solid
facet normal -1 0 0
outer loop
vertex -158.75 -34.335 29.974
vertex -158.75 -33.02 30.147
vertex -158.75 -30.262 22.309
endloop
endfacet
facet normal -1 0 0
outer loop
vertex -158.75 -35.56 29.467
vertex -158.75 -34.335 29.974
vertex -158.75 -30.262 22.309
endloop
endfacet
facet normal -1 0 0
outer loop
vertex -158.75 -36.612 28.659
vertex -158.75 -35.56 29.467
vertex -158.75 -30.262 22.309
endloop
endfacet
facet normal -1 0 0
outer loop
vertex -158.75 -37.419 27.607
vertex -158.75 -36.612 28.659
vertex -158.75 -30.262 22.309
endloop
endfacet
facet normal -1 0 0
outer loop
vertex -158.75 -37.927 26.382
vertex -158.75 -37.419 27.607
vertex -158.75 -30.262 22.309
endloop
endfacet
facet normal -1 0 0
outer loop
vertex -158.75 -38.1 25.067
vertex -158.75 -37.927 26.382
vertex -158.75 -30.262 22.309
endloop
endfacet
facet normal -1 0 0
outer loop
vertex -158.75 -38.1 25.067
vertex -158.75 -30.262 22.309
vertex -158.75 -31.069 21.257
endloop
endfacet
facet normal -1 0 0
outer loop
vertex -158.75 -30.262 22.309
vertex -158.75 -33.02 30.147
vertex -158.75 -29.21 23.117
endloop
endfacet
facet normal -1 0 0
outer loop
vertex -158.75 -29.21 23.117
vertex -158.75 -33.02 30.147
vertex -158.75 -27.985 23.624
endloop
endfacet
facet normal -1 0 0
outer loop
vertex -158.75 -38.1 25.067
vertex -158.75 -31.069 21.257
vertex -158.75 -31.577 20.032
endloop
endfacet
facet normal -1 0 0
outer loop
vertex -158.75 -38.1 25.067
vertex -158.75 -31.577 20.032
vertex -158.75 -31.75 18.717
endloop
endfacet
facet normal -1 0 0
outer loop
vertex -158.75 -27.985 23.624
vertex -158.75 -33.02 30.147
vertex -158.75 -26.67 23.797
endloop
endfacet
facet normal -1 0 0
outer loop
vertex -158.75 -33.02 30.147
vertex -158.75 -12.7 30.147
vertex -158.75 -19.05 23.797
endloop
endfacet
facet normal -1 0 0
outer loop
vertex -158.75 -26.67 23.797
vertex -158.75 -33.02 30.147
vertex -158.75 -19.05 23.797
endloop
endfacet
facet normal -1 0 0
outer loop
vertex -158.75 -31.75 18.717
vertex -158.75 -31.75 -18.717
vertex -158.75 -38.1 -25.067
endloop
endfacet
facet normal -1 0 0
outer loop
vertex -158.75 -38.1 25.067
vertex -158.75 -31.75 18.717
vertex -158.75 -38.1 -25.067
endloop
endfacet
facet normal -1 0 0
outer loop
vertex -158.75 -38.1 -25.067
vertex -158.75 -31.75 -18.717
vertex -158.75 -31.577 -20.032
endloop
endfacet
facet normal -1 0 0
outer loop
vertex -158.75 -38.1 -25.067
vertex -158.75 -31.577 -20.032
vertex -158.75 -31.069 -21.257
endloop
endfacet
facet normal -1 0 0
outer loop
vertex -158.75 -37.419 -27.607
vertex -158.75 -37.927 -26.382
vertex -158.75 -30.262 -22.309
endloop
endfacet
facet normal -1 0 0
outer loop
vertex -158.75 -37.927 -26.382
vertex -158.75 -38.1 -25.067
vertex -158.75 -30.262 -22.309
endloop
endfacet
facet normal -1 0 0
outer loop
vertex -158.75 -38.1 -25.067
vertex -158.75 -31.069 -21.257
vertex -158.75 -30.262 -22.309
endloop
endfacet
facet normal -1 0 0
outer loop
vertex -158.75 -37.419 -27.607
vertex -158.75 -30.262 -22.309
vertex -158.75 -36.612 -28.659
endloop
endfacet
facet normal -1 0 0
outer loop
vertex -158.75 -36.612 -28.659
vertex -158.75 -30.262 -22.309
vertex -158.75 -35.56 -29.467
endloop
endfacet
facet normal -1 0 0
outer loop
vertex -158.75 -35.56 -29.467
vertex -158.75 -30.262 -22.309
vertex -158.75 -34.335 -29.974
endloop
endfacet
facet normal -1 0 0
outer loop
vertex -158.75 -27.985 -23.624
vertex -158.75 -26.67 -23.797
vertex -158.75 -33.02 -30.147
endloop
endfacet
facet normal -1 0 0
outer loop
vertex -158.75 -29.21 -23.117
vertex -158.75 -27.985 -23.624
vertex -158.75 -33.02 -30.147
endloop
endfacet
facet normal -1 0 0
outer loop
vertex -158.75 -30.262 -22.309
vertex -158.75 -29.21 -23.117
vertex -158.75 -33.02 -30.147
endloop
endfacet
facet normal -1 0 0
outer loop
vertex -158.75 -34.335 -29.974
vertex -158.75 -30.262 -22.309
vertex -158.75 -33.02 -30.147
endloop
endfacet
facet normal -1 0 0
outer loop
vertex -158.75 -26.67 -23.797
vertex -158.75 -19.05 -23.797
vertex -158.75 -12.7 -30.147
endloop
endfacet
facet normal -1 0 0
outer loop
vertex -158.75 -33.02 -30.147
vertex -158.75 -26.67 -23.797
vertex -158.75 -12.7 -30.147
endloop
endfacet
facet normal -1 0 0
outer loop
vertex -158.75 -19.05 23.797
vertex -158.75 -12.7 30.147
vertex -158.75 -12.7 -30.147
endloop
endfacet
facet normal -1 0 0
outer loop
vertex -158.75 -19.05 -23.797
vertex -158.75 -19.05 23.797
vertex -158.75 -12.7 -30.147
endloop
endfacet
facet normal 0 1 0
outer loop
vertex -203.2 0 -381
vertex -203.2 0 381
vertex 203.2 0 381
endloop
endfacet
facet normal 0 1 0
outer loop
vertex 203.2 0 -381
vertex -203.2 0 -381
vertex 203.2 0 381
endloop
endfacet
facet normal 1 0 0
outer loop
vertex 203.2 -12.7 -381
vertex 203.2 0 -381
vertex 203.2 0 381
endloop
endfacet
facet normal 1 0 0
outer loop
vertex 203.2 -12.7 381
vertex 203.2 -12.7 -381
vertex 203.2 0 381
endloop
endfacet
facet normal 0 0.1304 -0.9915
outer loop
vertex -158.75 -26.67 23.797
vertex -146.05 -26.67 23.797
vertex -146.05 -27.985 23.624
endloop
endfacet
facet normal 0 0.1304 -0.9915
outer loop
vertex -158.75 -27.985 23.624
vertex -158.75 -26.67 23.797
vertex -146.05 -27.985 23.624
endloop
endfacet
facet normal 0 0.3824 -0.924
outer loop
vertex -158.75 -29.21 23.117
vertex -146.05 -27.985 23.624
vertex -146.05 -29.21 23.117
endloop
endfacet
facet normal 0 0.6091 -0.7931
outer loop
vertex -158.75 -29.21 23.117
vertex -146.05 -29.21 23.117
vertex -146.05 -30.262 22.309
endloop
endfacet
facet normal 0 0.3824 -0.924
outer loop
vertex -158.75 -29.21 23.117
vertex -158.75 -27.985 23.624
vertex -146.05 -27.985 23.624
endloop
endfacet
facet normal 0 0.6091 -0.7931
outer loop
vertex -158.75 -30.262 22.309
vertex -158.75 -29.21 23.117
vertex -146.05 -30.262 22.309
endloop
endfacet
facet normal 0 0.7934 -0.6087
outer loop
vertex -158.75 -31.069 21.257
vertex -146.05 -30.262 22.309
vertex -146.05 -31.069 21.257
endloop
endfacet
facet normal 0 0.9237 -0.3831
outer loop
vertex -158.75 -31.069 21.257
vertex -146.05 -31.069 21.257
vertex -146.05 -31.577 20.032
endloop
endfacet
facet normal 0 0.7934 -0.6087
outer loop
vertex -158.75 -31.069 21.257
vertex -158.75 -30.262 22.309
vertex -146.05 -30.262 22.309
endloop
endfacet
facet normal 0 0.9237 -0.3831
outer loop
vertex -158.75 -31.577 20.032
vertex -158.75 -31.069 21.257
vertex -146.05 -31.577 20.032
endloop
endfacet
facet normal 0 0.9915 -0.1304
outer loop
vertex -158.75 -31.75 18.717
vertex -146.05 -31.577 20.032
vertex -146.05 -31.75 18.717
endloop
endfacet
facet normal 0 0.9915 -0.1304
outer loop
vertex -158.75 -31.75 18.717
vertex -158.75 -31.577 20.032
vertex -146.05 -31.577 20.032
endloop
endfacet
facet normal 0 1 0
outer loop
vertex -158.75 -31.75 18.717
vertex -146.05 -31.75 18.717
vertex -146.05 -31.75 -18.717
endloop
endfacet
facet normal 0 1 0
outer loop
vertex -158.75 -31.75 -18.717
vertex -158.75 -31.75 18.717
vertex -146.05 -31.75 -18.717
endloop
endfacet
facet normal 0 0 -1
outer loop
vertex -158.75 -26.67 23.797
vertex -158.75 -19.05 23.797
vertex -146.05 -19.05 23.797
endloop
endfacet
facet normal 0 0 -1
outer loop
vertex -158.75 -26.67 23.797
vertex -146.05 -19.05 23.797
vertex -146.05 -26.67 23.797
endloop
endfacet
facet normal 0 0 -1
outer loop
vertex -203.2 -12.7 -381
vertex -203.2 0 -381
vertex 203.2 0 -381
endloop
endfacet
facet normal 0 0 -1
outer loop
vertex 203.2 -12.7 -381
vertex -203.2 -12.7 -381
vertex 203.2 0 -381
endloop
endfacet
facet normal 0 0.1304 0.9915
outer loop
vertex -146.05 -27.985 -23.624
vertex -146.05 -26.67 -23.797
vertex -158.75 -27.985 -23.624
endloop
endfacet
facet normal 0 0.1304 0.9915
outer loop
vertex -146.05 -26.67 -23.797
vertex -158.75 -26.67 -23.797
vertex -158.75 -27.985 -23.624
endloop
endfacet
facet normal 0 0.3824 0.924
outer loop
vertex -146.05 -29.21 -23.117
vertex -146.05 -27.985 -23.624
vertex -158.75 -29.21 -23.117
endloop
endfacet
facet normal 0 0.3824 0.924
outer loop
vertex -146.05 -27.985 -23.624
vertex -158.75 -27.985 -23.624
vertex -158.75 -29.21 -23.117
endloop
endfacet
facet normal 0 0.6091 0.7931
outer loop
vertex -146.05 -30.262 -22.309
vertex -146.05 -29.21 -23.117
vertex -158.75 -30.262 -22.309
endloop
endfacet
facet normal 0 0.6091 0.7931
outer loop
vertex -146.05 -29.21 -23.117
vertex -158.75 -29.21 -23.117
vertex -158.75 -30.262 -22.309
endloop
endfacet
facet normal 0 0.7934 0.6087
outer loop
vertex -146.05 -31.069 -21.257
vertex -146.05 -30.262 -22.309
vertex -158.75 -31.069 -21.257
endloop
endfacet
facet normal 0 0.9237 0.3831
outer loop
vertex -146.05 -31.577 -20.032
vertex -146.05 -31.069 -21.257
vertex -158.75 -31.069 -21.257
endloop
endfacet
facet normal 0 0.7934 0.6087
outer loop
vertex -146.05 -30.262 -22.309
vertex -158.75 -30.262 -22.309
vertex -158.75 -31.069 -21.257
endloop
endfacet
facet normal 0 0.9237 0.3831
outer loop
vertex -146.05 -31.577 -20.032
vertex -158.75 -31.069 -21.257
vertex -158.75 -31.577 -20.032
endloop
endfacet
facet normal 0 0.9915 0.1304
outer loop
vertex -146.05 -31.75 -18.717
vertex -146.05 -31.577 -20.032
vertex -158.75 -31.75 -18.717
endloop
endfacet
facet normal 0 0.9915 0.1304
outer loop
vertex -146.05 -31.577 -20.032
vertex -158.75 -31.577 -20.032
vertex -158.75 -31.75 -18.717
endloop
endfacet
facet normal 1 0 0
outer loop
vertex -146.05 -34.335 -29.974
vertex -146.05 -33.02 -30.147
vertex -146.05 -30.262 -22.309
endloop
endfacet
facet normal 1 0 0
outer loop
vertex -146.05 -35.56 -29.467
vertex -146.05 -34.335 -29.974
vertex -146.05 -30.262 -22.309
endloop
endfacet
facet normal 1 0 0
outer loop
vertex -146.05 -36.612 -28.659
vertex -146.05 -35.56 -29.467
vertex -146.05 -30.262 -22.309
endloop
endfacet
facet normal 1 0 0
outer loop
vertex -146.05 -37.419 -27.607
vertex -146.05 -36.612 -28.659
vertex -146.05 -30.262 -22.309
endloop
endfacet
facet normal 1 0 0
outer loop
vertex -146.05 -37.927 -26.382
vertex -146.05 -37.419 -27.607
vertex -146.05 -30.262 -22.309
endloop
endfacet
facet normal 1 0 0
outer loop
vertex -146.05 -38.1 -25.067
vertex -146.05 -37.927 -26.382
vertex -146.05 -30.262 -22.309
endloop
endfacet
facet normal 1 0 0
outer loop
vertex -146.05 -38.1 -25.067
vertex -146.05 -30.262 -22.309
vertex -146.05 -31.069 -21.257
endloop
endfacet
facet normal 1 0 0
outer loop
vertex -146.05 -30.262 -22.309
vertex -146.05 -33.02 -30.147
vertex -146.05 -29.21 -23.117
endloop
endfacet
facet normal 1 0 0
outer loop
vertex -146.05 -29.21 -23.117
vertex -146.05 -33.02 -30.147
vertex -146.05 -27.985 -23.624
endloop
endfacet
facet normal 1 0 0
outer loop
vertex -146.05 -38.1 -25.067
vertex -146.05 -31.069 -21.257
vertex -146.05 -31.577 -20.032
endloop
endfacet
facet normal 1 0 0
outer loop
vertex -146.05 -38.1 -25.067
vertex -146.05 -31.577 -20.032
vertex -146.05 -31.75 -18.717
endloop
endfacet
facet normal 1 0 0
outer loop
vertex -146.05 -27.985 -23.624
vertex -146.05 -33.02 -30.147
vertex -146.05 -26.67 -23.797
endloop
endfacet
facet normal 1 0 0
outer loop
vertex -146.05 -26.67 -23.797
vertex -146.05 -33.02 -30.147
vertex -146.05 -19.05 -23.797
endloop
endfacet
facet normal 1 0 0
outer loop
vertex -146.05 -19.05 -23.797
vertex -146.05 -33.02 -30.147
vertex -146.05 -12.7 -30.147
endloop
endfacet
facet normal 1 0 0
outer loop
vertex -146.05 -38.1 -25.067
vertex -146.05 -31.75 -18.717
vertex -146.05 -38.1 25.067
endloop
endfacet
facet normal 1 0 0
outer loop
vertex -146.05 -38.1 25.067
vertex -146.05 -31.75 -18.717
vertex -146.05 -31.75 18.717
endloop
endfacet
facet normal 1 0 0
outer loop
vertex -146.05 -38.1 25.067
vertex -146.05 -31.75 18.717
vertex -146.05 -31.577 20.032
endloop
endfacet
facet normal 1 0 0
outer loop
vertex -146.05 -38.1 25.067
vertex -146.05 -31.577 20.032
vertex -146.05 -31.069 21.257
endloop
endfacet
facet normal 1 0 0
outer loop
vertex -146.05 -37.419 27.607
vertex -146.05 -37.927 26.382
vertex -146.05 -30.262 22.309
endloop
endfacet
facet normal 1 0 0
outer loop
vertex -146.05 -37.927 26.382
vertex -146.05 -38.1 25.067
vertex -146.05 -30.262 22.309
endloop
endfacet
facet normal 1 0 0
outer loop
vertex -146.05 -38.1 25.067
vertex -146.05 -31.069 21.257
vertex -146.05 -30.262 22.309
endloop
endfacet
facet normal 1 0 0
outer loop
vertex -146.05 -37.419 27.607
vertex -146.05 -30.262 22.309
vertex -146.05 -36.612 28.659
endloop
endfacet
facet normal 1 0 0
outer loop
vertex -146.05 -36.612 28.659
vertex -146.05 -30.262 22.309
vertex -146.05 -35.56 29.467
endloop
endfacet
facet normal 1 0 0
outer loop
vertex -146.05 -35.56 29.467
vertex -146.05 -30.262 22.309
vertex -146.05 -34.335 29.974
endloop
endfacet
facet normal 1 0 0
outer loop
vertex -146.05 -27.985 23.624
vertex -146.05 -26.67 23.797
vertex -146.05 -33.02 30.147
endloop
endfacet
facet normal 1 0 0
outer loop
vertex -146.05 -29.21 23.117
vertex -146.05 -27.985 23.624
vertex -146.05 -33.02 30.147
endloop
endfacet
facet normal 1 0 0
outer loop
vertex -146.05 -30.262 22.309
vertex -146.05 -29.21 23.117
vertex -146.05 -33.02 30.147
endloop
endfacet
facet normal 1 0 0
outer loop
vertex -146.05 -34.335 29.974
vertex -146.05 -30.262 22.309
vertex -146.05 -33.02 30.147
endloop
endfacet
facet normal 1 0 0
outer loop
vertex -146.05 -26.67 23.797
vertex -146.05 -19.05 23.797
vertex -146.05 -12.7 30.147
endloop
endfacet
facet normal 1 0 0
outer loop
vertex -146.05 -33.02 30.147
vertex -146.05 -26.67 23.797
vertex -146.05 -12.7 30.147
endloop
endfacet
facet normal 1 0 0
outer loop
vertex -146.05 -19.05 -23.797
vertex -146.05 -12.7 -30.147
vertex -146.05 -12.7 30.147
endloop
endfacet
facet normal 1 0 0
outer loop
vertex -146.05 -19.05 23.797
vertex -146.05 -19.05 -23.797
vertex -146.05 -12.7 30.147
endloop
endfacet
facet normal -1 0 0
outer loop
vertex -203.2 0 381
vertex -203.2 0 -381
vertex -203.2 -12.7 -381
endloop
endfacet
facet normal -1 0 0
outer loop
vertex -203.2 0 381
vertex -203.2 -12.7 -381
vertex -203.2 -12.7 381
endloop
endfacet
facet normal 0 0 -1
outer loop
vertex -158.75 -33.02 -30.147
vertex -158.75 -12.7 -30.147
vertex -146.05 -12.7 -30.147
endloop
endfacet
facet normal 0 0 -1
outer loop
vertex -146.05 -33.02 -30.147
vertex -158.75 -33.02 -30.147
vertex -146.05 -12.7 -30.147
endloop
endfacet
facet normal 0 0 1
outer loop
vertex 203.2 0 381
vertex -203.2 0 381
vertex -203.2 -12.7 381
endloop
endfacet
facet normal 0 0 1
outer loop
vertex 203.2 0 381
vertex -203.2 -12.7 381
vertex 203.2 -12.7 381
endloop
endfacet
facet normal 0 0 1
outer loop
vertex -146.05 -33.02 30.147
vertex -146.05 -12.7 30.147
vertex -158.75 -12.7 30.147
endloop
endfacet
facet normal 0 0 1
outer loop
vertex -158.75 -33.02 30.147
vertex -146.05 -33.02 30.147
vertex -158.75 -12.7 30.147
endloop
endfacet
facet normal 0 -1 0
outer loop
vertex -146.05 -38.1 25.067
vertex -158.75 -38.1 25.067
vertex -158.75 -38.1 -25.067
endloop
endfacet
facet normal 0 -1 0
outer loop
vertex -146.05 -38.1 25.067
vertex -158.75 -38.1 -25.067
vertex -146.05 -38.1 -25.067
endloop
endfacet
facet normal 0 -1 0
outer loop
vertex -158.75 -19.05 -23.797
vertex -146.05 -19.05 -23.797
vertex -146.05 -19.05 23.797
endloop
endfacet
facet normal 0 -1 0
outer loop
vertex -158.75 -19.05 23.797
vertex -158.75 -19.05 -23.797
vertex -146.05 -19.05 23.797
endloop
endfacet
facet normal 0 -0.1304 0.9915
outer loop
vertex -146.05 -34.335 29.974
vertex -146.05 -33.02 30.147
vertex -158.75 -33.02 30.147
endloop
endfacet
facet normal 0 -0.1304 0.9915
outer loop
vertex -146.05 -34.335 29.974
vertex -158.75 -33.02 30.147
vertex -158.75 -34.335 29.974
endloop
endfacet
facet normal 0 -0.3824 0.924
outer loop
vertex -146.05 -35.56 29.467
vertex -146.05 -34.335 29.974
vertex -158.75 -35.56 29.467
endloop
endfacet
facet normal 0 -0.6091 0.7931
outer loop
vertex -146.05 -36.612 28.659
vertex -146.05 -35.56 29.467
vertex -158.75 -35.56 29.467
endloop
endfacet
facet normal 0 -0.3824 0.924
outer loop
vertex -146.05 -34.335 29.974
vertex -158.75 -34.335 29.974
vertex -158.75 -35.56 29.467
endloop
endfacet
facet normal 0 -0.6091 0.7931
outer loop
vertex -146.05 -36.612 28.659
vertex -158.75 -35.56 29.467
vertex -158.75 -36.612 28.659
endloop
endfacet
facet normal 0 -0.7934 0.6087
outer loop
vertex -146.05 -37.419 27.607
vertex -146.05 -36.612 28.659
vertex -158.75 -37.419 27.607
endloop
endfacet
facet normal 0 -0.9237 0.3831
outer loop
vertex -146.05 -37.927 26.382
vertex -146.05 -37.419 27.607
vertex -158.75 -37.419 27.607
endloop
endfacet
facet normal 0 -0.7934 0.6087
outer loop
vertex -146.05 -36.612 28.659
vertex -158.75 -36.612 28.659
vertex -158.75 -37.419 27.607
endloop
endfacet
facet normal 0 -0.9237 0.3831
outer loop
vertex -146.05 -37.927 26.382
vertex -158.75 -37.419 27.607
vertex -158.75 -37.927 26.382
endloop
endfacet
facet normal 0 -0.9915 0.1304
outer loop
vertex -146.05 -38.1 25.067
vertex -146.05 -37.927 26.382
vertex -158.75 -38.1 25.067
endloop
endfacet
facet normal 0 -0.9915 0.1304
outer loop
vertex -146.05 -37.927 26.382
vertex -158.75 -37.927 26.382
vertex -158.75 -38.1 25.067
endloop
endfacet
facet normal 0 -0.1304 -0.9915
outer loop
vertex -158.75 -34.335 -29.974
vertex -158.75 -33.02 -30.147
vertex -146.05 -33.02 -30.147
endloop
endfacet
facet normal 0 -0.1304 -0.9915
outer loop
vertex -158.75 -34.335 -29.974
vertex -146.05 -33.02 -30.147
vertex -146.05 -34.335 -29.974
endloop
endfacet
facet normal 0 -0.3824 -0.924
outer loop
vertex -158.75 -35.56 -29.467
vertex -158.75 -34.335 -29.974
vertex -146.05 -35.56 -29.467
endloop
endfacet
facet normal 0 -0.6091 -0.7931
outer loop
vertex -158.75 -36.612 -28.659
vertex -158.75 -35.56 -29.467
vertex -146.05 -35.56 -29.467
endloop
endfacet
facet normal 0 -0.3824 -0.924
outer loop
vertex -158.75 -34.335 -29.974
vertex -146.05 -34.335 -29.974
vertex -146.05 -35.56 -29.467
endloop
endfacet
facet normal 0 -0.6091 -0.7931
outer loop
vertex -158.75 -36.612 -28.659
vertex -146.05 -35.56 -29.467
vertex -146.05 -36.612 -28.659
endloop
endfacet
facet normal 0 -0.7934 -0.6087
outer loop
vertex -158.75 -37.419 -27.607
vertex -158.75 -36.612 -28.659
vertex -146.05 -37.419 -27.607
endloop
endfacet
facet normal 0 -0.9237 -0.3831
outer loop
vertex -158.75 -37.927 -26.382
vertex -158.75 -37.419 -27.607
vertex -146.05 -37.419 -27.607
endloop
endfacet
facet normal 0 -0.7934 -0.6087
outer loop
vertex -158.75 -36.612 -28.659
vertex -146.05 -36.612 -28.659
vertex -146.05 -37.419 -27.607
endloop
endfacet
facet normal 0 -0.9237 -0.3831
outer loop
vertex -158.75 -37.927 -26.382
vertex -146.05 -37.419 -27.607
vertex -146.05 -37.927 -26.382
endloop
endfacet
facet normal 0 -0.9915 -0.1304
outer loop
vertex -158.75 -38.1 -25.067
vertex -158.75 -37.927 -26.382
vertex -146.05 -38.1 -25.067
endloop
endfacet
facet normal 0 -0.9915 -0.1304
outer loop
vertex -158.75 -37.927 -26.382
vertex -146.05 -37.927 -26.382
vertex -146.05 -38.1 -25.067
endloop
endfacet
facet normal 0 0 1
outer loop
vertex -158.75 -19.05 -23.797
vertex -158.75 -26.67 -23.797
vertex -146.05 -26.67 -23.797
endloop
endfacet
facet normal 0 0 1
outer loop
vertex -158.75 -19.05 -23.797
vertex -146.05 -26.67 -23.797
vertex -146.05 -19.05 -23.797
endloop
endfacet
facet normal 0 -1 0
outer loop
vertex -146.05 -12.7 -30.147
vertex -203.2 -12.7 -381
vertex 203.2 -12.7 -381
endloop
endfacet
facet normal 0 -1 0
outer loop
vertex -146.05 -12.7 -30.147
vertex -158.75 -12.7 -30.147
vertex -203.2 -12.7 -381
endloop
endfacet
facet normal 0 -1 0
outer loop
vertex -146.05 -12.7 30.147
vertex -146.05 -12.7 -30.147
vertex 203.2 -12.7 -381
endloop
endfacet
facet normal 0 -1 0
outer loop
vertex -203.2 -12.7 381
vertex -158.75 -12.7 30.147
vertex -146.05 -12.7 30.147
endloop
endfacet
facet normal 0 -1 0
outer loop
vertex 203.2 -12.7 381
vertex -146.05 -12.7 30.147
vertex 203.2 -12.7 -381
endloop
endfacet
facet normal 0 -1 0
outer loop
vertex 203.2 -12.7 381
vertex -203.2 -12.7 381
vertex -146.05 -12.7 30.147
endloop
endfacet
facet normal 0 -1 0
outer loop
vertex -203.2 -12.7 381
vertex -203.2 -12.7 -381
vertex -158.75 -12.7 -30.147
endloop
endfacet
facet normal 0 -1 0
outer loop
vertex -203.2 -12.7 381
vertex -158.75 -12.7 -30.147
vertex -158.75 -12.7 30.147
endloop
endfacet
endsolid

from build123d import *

# Parameters (mm, degrees)
F0_W     = 406.4
F0_H     = 762
F1_DEPTH = 12.7
F3_DEPTH = 25.4
F5_DEPTH = 86.36
F6_R     = 5.08


with BuildPart() as f1:
    # F0 (on Front) → F1 (new body)
    with BuildSketch(Plane.XZ):
        Rectangle(F0_W, F0_H)
    extrude(amount=F1_DEPTH)

    # F2 (on face) → F3 (join)
    with BuildSketch(Plane.XZ.offset(12.7)):
        Polygon((-146.05, -30.14731), (-146.05, 30.14731), (-158.75, 30.14731), (-158.75, 0), (-158.75, -30.14731), align=None)
    extrude(amount=F3_DEPTH)

    # F4 (on face) → F5 (cut)
    with BuildSketch(Plane.YZ.offset(-146.05)):
        Polygon((-31.75, 23.79731), (-31.75, 0), (-31.75, -23.79731), (-19.05, -23.79731), (-19.05, 23.79731), align=None)
    extrude(amount=-F5_DEPTH, mode=Mode.SUBTRACT)

    # F6
    f6_edges = [f1.edges().sort_by_distance(p)[0] for p in [
        (-152.4, -38.1, 30.14731),
        (-152.4, -38.1, -30.14731),
        (-152.4, -31.75, 23.79731),
        (-152.4, -31.75, -23.79731),
    ]]
    fillet(f6_edges, radius=F6_R)


solid = f1.part
